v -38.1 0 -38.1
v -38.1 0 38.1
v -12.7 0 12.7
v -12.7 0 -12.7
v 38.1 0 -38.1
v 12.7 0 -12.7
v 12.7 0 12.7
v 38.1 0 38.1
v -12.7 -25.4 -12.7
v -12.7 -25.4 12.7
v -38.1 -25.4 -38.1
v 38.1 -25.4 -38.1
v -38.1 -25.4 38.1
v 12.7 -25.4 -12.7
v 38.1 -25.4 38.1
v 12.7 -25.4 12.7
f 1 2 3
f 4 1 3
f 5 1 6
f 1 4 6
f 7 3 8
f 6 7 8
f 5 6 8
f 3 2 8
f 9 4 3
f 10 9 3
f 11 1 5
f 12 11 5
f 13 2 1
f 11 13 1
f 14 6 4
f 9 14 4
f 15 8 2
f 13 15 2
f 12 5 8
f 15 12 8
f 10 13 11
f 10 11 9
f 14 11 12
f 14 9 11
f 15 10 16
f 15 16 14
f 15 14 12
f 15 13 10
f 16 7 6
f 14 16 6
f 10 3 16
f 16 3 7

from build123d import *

# Parameters (mm, degrees)
F0_W     = 25.4
F0_H     = 25.4
F1_DEPTH = 25.4


with BuildPart() as f1:
    # F0 (on Front) → F1 (new body)
    with BuildSketch(Plane.XZ):
        with Locations((-25.4, 25.4)):
            Rectangle(F0_W, F0_H)
        with Locations((0, 25.4)):
            Rectangle(F0_W, F0_H)
        with Locations((25.4, 25.4)):
            Rectangle(F0_W, F0_H)
        with Locations((25.4, 0)):
            Rectangle(F0_W, F0_H)
        with Locations((25.4, -25.4)):
            Rectangle(F0_W, F0_H)
        with Locations((0, -25.4)):
            Rectangle(F0_W, F0_H)
        with Locations((-25.4, -25.4)):
            Rectangle(F0_W, F0_H)
        with Locations((-25.4, 0)):
            Rectangle(F0_W, F0_H)
    extrude(amount=F1_DEPTH)


solid = f1.part
